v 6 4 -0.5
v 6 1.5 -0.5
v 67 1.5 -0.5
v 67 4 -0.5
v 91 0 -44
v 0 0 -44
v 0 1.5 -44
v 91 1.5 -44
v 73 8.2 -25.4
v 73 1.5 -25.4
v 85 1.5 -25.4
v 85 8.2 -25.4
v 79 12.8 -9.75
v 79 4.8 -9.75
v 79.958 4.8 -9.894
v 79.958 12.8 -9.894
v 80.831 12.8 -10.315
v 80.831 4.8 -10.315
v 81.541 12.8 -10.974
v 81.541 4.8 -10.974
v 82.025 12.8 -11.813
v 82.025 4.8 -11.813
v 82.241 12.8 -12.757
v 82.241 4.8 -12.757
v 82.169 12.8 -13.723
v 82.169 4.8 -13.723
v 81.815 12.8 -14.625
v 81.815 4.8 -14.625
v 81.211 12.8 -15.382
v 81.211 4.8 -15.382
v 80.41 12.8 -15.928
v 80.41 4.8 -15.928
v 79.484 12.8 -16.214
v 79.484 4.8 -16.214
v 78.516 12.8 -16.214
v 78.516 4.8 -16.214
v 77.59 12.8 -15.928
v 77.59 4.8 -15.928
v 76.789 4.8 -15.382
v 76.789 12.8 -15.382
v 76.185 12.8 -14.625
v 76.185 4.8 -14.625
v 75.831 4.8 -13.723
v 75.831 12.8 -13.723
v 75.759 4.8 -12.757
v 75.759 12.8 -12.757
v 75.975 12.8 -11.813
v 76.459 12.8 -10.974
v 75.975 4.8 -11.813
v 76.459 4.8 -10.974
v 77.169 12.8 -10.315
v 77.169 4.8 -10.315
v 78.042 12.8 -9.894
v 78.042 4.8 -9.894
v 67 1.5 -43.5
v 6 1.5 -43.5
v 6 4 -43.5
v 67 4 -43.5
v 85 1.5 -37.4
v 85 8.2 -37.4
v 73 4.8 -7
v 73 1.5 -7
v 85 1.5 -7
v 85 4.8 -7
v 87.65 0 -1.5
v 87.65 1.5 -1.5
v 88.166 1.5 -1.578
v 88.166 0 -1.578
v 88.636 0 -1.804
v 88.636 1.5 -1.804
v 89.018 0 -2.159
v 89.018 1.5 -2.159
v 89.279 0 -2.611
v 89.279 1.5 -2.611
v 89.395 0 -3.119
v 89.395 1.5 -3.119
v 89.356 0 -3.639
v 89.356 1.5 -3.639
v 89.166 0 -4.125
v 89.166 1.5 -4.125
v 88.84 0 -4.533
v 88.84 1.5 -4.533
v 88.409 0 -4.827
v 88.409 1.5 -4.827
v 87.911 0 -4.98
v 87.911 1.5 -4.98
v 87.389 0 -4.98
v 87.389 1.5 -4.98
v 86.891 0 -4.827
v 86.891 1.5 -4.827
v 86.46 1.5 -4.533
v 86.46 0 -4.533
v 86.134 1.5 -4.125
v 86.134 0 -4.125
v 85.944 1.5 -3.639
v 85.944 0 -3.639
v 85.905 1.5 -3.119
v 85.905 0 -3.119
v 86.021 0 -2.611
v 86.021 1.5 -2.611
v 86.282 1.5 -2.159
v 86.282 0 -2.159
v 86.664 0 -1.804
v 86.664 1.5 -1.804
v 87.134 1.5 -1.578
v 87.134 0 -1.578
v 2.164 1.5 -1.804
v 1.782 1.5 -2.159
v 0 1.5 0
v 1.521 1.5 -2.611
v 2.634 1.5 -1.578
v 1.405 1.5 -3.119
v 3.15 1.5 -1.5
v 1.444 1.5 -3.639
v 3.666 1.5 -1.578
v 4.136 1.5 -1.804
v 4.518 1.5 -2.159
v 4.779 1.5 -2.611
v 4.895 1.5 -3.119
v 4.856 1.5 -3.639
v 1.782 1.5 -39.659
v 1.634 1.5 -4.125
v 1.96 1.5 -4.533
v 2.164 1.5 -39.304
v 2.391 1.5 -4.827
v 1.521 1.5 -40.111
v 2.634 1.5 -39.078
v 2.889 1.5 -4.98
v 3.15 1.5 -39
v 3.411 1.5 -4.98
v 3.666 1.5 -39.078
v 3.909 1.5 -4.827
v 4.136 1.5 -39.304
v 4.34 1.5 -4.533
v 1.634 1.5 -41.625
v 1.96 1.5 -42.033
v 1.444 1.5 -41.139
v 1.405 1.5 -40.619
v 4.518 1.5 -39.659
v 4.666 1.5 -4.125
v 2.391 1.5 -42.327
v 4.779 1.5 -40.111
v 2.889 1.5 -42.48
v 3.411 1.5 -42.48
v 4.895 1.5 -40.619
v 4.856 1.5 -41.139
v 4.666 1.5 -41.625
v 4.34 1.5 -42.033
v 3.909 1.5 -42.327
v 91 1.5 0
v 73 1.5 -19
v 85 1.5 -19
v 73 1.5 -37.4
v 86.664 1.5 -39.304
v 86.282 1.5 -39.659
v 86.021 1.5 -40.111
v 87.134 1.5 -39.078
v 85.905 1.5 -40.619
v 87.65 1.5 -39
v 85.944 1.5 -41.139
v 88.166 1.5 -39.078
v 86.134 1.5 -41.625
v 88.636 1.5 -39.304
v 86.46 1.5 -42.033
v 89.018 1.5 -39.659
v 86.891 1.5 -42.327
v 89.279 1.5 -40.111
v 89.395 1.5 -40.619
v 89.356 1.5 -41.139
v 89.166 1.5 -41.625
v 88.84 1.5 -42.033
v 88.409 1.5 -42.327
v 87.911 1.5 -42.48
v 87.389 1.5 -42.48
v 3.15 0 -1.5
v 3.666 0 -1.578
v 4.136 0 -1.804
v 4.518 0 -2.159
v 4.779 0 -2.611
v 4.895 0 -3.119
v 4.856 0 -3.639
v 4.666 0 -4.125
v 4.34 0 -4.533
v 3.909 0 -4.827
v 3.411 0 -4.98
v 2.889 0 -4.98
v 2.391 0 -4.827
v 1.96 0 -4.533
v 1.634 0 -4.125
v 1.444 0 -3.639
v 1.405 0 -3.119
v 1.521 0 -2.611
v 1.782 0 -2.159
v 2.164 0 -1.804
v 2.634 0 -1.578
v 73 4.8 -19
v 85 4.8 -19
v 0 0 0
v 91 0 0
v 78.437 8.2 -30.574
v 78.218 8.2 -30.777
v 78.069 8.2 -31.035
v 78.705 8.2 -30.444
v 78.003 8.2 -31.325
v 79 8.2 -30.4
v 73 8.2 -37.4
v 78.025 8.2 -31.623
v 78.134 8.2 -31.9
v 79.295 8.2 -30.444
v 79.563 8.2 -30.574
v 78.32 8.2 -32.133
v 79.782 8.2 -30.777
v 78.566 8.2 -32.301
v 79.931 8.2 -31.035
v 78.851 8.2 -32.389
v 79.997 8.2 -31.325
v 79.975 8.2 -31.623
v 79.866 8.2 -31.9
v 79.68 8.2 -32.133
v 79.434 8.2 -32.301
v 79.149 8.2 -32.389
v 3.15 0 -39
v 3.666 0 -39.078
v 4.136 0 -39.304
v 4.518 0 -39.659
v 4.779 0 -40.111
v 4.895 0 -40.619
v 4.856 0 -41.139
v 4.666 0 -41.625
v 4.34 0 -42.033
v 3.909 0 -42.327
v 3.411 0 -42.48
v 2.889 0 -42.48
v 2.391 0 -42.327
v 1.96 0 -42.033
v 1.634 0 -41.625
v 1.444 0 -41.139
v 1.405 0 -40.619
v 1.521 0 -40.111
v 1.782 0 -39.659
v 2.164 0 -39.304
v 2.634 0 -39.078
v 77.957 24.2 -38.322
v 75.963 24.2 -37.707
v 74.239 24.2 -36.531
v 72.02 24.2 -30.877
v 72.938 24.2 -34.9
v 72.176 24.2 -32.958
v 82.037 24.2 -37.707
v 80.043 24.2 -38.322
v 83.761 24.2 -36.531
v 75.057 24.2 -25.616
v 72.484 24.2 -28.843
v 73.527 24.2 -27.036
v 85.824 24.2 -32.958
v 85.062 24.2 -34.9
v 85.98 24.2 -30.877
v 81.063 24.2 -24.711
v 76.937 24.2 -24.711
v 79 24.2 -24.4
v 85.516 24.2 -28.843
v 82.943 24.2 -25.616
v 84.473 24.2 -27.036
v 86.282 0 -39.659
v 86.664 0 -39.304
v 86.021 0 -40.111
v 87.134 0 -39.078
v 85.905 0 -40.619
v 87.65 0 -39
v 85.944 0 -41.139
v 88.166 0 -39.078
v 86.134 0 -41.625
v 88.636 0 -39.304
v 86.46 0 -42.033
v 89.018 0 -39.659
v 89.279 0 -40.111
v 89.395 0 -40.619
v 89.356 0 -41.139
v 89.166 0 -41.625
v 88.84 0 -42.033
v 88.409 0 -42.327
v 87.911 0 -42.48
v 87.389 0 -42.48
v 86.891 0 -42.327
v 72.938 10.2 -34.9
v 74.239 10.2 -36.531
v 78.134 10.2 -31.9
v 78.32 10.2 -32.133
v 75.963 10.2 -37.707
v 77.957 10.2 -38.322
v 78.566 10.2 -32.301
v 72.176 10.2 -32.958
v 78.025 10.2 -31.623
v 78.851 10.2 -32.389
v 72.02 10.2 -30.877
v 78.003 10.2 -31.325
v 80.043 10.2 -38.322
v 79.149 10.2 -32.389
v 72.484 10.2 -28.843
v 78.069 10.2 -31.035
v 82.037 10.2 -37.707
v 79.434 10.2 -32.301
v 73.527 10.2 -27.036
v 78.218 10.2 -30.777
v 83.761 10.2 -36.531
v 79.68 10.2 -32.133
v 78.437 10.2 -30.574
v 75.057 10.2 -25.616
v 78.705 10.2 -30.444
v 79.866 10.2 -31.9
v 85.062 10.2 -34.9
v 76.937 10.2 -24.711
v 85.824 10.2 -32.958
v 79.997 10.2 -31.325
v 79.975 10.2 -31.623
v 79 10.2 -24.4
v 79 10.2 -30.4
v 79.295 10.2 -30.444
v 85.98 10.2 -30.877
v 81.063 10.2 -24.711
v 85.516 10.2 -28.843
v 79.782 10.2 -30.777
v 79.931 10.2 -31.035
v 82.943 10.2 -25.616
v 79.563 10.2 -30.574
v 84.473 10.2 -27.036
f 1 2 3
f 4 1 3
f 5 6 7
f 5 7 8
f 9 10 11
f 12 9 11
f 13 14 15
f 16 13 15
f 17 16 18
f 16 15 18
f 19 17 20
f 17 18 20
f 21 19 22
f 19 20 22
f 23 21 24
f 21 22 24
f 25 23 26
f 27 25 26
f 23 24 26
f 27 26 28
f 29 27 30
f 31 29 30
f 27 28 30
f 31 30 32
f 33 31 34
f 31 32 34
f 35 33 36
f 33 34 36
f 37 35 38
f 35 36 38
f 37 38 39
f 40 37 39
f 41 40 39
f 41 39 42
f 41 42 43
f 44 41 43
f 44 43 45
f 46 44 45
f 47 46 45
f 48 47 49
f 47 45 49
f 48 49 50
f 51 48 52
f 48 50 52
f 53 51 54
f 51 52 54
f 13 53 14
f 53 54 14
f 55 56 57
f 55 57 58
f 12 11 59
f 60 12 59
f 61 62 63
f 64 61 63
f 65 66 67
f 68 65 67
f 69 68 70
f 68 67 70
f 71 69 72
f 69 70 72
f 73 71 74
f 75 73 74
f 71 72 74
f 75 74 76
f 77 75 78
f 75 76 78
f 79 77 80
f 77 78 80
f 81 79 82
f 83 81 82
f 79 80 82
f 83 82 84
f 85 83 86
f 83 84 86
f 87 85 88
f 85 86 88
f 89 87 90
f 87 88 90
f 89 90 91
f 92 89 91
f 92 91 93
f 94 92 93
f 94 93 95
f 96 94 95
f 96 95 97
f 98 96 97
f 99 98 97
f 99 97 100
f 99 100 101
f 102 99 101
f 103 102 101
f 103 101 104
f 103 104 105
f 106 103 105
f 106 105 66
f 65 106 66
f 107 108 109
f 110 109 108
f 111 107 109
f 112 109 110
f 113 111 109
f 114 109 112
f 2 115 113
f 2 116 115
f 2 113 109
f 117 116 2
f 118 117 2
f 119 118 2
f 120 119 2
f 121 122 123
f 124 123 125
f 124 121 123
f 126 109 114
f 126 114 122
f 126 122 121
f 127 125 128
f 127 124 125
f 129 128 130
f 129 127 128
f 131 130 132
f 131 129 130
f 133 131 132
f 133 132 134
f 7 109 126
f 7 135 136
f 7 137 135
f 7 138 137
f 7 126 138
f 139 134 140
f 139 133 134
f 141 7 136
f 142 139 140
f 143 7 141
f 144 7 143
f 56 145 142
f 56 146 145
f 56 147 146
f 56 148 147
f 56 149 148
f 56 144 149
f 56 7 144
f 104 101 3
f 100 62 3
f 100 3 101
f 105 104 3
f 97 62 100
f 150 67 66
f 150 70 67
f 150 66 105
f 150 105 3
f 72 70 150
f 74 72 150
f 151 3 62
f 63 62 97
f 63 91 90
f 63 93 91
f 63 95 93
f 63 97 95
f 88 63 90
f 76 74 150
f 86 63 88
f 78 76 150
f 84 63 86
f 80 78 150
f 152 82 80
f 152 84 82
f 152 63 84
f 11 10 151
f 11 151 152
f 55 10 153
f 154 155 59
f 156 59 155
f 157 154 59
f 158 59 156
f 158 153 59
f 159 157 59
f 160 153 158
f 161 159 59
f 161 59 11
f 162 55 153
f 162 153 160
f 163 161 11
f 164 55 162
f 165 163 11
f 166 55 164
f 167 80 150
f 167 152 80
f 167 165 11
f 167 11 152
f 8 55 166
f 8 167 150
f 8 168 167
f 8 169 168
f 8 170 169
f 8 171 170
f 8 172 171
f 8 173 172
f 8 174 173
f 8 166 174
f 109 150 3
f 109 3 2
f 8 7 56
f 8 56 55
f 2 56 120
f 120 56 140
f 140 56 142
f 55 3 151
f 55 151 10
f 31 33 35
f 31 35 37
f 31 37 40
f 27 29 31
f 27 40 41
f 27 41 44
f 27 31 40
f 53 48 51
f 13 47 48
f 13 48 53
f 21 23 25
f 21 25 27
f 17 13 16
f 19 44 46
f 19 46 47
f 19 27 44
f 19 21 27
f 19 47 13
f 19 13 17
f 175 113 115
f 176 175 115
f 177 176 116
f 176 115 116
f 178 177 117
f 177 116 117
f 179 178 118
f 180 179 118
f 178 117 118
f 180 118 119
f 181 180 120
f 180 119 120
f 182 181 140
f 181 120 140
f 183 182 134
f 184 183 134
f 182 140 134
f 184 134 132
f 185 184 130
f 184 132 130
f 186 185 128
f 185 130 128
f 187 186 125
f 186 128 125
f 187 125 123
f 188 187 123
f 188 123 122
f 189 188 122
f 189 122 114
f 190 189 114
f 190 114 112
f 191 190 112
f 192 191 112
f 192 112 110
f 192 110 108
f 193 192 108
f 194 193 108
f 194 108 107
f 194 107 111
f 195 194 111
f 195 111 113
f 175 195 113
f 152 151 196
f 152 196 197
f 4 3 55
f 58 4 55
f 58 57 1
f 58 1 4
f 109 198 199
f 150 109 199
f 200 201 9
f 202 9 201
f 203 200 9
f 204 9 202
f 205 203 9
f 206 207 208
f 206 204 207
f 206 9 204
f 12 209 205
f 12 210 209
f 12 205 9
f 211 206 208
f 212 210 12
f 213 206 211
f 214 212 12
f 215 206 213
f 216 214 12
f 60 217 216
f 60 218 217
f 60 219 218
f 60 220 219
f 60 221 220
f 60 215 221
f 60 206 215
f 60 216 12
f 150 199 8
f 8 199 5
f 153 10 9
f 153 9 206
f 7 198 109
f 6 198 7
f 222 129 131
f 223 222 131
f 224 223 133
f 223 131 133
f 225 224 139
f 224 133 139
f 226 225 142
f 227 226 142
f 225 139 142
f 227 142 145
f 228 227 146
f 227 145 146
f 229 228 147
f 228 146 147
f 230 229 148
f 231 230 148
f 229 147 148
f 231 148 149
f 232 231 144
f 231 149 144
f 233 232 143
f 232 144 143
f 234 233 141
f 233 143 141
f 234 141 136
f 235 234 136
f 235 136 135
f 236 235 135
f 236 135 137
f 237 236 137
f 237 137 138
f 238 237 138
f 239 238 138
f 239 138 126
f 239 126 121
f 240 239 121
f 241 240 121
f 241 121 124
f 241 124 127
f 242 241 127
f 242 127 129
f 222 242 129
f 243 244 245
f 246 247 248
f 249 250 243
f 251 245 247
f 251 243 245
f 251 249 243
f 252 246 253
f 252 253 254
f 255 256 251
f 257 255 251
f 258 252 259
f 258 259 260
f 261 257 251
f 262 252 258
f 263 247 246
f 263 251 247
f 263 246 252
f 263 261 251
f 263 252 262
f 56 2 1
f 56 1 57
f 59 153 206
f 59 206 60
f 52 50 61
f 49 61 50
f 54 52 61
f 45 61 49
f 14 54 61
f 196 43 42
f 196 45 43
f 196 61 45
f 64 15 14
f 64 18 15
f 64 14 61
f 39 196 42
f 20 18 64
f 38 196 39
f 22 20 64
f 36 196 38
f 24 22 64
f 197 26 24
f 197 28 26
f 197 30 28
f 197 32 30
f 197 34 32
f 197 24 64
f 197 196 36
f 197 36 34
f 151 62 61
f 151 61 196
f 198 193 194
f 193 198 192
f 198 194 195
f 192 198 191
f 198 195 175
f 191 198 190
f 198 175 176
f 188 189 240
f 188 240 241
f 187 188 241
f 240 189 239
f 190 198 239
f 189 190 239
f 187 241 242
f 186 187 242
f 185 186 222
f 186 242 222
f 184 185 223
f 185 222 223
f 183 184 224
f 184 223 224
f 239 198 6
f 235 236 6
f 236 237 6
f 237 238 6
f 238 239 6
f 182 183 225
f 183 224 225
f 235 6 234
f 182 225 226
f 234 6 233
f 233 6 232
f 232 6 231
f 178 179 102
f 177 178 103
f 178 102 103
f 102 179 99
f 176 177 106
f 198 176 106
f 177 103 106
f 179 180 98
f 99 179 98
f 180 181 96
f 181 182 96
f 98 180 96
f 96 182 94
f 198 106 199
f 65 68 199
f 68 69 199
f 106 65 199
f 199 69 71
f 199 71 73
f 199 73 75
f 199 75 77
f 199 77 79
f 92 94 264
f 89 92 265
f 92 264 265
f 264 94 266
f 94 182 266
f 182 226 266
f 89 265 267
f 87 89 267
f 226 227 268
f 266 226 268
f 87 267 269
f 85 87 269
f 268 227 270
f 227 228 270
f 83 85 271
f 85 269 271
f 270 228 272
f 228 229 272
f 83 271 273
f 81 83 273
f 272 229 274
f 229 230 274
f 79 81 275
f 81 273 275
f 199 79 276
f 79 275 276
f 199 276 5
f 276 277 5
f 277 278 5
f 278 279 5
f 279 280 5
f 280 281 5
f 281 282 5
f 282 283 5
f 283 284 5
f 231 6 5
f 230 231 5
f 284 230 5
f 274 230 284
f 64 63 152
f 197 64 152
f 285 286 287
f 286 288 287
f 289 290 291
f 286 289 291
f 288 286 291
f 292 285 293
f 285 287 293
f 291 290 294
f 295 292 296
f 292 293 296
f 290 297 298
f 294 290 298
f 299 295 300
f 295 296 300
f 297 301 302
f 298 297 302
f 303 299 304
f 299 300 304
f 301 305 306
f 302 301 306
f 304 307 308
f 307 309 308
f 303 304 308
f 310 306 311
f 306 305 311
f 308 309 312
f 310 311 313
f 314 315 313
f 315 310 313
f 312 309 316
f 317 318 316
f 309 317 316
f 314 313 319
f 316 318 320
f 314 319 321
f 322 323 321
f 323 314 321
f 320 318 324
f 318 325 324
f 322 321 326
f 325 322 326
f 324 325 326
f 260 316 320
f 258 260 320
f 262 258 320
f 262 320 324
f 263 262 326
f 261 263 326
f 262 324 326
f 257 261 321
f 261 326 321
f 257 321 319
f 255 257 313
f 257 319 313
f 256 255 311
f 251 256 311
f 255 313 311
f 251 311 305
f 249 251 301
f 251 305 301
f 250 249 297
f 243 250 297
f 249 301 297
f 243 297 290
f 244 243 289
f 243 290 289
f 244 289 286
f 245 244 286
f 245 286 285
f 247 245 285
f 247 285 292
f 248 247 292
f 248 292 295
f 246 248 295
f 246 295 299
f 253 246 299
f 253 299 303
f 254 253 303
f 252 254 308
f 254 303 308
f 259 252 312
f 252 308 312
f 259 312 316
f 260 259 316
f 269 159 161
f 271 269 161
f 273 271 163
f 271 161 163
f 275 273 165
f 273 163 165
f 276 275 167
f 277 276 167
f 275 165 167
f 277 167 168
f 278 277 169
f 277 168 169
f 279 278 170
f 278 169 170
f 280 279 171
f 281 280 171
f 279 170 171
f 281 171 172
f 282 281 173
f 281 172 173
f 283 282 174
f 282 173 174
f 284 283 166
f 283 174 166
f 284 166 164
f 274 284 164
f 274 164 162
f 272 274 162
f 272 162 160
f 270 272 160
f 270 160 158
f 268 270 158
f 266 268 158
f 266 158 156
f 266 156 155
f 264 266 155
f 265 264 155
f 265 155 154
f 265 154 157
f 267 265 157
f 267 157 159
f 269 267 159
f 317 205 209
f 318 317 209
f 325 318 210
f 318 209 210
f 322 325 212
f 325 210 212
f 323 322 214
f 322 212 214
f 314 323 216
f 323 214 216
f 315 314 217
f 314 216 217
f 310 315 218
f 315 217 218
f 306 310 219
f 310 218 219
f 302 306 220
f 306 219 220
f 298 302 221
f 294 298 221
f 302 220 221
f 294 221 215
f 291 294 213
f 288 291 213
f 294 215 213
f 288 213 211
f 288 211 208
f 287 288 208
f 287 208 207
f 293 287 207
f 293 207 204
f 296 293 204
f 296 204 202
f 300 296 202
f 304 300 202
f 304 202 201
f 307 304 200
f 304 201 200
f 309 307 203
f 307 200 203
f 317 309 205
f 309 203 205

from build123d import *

# Parameters (mm, degrees)
SKETCH_1_W          = 91
SKETCH_1_H          = 44
EXTRUDE_1_DEPTH     = 1.5
SKETCH_2_W          = 61
SKETCH_2_H          = 43
EXTRUDE_2_DEPTH     = 2.5
SKETCH_3_R          = 1.75
CUT_EXTRUDE_1_DEPTH = 2.5
SKETCH_4_W          = 12
SKETCH_4_H          = 12
EXTRUDE_3_DEPTH     = 6.7
SKETCH_5_W          = 12
SKETCH_5_H          = 12
CUT_EXTRUDE_2_DEPTH = 3.4
SKETCH_6_R          = 1
EXTRUDE_4_DEPTH     = 2
SKETCH_7_R          = 7
EXTRUDE_5_DEPTH     = 14
SKETCH_8_R          = 3.25
EXTRUDE_6_DEPTH     = 8


with BuildPart() as part:
    # 草图1 → 凸台-拉伸1 (new body)
    with BuildSketch(Plane(origin=(0, 0, 0), x_dir=(1, 0, 0), z_dir=(0, 1, 0))):
        with Locations((45.5, 22)):
            Rectangle(SKETCH_1_W, SKETCH_1_H)
    extrude(amount=EXTRUDE_1_DEPTH)

    # 草图2 → 凸台-拉伸2 (add)
    with BuildSketch(Plane(origin=(0, 1.5, 0), x_dir=(1, 0, 0), z_dir=(0, 1, 0))):
        with Locations((36.5, 22)):
            Rectangle(SKETCH_2_W, SKETCH_2_H)
    extrude(amount=EXTRUDE_2_DEPTH)

    # 草图3 → 切除-拉伸1 (cut)
    with BuildSketch(Plane(origin=(0, 1.5, 0), x_dir=(1, 0, 0), z_dir=(0, 1, 0))):
        with Locations(Location((87.65, 40.75, 0), (0, 0, 270))):
            Circle(SKETCH_3_R)
        with Locations(Location((87.65, 3.25, 0), (0, 0, 270))):
            Circle(SKETCH_3_R)
        with Locations(Location((3.15, 3.25, 0), (0, 0, 270))):
            Circle(SKETCH_3_R)
        with Locations(Location((3.15, 40.75, 0), (0, 0, 270))):
            Circle(SKETCH_3_R)
    extrude(amount=-CUT_EXTRUDE_1_DEPTH, mode=Mode.SUBTRACT)

    # 草图4 → 凸台-拉伸3 (add)
    with BuildSketch(Plane(origin=(0, 1.5, 0), x_dir=(1, 0, 0), z_dir=(0, 1, 0))):
        with Locations((79, 31.4)):
            Rectangle(SKETCH_4_W, SKETCH_4_H)
        with Locations((79, 13)):
            Rectangle(SKETCH_4_W, SKETCH_4_H)
    extrude(amount=EXTRUDE_3_DEPTH)

    # 草图5 → 切除-拉伸2 (cut)
    with BuildSketch(Plane(origin=(0, 8.2, 0), x_dir=(1, 0, 0), z_dir=(0, 1, 0))):
        with Locations((79, 13)):
            Rectangle(SKETCH_5_W, SKETCH_5_H)
    extrude(amount=-CUT_EXTRUDE_2_DEPTH, mode=Mode.SUBTRACT)

    # 草图6 → 凸台-拉伸4 (add)
    with BuildSketch(Plane(origin=(0, 8.2, 0), x_dir=(1, 0, 0), z_dir=(0, 1, 0))):
        with Locations(Location((79, 31.4, 0), (0, 0, 270))):
            Circle(SKETCH_6_R)
    extrude(amount=EXTRUDE_4_DEPTH)

    # 草图7 → 凸台-拉伸5 (add)
    with BuildSketch(Plane(origin=(0, 10.2, 0), x_dir=(1, 0, 0), z_dir=(0, 1, 0))):
        with Locations(Location((79, 31.4, 0), (0, 0, 270))):
            Circle(SKETCH_7_R)
    extrude(amount=EXTRUDE_5_DEPTH)

    # 草图8 → 凸台-拉伸6 (add)
    with BuildSketch(Plane(origin=(0, 4.8, 0), x_dir=(1, 0, 0), z_dir=(0, 1, 0))):
        with Locations(Location((79, 13, 0), (0, 0, 270))):
            Circle(SKETCH_8_R)
    extrude(amount=EXTRUDE_6_DEPTH)


solid = part.part
